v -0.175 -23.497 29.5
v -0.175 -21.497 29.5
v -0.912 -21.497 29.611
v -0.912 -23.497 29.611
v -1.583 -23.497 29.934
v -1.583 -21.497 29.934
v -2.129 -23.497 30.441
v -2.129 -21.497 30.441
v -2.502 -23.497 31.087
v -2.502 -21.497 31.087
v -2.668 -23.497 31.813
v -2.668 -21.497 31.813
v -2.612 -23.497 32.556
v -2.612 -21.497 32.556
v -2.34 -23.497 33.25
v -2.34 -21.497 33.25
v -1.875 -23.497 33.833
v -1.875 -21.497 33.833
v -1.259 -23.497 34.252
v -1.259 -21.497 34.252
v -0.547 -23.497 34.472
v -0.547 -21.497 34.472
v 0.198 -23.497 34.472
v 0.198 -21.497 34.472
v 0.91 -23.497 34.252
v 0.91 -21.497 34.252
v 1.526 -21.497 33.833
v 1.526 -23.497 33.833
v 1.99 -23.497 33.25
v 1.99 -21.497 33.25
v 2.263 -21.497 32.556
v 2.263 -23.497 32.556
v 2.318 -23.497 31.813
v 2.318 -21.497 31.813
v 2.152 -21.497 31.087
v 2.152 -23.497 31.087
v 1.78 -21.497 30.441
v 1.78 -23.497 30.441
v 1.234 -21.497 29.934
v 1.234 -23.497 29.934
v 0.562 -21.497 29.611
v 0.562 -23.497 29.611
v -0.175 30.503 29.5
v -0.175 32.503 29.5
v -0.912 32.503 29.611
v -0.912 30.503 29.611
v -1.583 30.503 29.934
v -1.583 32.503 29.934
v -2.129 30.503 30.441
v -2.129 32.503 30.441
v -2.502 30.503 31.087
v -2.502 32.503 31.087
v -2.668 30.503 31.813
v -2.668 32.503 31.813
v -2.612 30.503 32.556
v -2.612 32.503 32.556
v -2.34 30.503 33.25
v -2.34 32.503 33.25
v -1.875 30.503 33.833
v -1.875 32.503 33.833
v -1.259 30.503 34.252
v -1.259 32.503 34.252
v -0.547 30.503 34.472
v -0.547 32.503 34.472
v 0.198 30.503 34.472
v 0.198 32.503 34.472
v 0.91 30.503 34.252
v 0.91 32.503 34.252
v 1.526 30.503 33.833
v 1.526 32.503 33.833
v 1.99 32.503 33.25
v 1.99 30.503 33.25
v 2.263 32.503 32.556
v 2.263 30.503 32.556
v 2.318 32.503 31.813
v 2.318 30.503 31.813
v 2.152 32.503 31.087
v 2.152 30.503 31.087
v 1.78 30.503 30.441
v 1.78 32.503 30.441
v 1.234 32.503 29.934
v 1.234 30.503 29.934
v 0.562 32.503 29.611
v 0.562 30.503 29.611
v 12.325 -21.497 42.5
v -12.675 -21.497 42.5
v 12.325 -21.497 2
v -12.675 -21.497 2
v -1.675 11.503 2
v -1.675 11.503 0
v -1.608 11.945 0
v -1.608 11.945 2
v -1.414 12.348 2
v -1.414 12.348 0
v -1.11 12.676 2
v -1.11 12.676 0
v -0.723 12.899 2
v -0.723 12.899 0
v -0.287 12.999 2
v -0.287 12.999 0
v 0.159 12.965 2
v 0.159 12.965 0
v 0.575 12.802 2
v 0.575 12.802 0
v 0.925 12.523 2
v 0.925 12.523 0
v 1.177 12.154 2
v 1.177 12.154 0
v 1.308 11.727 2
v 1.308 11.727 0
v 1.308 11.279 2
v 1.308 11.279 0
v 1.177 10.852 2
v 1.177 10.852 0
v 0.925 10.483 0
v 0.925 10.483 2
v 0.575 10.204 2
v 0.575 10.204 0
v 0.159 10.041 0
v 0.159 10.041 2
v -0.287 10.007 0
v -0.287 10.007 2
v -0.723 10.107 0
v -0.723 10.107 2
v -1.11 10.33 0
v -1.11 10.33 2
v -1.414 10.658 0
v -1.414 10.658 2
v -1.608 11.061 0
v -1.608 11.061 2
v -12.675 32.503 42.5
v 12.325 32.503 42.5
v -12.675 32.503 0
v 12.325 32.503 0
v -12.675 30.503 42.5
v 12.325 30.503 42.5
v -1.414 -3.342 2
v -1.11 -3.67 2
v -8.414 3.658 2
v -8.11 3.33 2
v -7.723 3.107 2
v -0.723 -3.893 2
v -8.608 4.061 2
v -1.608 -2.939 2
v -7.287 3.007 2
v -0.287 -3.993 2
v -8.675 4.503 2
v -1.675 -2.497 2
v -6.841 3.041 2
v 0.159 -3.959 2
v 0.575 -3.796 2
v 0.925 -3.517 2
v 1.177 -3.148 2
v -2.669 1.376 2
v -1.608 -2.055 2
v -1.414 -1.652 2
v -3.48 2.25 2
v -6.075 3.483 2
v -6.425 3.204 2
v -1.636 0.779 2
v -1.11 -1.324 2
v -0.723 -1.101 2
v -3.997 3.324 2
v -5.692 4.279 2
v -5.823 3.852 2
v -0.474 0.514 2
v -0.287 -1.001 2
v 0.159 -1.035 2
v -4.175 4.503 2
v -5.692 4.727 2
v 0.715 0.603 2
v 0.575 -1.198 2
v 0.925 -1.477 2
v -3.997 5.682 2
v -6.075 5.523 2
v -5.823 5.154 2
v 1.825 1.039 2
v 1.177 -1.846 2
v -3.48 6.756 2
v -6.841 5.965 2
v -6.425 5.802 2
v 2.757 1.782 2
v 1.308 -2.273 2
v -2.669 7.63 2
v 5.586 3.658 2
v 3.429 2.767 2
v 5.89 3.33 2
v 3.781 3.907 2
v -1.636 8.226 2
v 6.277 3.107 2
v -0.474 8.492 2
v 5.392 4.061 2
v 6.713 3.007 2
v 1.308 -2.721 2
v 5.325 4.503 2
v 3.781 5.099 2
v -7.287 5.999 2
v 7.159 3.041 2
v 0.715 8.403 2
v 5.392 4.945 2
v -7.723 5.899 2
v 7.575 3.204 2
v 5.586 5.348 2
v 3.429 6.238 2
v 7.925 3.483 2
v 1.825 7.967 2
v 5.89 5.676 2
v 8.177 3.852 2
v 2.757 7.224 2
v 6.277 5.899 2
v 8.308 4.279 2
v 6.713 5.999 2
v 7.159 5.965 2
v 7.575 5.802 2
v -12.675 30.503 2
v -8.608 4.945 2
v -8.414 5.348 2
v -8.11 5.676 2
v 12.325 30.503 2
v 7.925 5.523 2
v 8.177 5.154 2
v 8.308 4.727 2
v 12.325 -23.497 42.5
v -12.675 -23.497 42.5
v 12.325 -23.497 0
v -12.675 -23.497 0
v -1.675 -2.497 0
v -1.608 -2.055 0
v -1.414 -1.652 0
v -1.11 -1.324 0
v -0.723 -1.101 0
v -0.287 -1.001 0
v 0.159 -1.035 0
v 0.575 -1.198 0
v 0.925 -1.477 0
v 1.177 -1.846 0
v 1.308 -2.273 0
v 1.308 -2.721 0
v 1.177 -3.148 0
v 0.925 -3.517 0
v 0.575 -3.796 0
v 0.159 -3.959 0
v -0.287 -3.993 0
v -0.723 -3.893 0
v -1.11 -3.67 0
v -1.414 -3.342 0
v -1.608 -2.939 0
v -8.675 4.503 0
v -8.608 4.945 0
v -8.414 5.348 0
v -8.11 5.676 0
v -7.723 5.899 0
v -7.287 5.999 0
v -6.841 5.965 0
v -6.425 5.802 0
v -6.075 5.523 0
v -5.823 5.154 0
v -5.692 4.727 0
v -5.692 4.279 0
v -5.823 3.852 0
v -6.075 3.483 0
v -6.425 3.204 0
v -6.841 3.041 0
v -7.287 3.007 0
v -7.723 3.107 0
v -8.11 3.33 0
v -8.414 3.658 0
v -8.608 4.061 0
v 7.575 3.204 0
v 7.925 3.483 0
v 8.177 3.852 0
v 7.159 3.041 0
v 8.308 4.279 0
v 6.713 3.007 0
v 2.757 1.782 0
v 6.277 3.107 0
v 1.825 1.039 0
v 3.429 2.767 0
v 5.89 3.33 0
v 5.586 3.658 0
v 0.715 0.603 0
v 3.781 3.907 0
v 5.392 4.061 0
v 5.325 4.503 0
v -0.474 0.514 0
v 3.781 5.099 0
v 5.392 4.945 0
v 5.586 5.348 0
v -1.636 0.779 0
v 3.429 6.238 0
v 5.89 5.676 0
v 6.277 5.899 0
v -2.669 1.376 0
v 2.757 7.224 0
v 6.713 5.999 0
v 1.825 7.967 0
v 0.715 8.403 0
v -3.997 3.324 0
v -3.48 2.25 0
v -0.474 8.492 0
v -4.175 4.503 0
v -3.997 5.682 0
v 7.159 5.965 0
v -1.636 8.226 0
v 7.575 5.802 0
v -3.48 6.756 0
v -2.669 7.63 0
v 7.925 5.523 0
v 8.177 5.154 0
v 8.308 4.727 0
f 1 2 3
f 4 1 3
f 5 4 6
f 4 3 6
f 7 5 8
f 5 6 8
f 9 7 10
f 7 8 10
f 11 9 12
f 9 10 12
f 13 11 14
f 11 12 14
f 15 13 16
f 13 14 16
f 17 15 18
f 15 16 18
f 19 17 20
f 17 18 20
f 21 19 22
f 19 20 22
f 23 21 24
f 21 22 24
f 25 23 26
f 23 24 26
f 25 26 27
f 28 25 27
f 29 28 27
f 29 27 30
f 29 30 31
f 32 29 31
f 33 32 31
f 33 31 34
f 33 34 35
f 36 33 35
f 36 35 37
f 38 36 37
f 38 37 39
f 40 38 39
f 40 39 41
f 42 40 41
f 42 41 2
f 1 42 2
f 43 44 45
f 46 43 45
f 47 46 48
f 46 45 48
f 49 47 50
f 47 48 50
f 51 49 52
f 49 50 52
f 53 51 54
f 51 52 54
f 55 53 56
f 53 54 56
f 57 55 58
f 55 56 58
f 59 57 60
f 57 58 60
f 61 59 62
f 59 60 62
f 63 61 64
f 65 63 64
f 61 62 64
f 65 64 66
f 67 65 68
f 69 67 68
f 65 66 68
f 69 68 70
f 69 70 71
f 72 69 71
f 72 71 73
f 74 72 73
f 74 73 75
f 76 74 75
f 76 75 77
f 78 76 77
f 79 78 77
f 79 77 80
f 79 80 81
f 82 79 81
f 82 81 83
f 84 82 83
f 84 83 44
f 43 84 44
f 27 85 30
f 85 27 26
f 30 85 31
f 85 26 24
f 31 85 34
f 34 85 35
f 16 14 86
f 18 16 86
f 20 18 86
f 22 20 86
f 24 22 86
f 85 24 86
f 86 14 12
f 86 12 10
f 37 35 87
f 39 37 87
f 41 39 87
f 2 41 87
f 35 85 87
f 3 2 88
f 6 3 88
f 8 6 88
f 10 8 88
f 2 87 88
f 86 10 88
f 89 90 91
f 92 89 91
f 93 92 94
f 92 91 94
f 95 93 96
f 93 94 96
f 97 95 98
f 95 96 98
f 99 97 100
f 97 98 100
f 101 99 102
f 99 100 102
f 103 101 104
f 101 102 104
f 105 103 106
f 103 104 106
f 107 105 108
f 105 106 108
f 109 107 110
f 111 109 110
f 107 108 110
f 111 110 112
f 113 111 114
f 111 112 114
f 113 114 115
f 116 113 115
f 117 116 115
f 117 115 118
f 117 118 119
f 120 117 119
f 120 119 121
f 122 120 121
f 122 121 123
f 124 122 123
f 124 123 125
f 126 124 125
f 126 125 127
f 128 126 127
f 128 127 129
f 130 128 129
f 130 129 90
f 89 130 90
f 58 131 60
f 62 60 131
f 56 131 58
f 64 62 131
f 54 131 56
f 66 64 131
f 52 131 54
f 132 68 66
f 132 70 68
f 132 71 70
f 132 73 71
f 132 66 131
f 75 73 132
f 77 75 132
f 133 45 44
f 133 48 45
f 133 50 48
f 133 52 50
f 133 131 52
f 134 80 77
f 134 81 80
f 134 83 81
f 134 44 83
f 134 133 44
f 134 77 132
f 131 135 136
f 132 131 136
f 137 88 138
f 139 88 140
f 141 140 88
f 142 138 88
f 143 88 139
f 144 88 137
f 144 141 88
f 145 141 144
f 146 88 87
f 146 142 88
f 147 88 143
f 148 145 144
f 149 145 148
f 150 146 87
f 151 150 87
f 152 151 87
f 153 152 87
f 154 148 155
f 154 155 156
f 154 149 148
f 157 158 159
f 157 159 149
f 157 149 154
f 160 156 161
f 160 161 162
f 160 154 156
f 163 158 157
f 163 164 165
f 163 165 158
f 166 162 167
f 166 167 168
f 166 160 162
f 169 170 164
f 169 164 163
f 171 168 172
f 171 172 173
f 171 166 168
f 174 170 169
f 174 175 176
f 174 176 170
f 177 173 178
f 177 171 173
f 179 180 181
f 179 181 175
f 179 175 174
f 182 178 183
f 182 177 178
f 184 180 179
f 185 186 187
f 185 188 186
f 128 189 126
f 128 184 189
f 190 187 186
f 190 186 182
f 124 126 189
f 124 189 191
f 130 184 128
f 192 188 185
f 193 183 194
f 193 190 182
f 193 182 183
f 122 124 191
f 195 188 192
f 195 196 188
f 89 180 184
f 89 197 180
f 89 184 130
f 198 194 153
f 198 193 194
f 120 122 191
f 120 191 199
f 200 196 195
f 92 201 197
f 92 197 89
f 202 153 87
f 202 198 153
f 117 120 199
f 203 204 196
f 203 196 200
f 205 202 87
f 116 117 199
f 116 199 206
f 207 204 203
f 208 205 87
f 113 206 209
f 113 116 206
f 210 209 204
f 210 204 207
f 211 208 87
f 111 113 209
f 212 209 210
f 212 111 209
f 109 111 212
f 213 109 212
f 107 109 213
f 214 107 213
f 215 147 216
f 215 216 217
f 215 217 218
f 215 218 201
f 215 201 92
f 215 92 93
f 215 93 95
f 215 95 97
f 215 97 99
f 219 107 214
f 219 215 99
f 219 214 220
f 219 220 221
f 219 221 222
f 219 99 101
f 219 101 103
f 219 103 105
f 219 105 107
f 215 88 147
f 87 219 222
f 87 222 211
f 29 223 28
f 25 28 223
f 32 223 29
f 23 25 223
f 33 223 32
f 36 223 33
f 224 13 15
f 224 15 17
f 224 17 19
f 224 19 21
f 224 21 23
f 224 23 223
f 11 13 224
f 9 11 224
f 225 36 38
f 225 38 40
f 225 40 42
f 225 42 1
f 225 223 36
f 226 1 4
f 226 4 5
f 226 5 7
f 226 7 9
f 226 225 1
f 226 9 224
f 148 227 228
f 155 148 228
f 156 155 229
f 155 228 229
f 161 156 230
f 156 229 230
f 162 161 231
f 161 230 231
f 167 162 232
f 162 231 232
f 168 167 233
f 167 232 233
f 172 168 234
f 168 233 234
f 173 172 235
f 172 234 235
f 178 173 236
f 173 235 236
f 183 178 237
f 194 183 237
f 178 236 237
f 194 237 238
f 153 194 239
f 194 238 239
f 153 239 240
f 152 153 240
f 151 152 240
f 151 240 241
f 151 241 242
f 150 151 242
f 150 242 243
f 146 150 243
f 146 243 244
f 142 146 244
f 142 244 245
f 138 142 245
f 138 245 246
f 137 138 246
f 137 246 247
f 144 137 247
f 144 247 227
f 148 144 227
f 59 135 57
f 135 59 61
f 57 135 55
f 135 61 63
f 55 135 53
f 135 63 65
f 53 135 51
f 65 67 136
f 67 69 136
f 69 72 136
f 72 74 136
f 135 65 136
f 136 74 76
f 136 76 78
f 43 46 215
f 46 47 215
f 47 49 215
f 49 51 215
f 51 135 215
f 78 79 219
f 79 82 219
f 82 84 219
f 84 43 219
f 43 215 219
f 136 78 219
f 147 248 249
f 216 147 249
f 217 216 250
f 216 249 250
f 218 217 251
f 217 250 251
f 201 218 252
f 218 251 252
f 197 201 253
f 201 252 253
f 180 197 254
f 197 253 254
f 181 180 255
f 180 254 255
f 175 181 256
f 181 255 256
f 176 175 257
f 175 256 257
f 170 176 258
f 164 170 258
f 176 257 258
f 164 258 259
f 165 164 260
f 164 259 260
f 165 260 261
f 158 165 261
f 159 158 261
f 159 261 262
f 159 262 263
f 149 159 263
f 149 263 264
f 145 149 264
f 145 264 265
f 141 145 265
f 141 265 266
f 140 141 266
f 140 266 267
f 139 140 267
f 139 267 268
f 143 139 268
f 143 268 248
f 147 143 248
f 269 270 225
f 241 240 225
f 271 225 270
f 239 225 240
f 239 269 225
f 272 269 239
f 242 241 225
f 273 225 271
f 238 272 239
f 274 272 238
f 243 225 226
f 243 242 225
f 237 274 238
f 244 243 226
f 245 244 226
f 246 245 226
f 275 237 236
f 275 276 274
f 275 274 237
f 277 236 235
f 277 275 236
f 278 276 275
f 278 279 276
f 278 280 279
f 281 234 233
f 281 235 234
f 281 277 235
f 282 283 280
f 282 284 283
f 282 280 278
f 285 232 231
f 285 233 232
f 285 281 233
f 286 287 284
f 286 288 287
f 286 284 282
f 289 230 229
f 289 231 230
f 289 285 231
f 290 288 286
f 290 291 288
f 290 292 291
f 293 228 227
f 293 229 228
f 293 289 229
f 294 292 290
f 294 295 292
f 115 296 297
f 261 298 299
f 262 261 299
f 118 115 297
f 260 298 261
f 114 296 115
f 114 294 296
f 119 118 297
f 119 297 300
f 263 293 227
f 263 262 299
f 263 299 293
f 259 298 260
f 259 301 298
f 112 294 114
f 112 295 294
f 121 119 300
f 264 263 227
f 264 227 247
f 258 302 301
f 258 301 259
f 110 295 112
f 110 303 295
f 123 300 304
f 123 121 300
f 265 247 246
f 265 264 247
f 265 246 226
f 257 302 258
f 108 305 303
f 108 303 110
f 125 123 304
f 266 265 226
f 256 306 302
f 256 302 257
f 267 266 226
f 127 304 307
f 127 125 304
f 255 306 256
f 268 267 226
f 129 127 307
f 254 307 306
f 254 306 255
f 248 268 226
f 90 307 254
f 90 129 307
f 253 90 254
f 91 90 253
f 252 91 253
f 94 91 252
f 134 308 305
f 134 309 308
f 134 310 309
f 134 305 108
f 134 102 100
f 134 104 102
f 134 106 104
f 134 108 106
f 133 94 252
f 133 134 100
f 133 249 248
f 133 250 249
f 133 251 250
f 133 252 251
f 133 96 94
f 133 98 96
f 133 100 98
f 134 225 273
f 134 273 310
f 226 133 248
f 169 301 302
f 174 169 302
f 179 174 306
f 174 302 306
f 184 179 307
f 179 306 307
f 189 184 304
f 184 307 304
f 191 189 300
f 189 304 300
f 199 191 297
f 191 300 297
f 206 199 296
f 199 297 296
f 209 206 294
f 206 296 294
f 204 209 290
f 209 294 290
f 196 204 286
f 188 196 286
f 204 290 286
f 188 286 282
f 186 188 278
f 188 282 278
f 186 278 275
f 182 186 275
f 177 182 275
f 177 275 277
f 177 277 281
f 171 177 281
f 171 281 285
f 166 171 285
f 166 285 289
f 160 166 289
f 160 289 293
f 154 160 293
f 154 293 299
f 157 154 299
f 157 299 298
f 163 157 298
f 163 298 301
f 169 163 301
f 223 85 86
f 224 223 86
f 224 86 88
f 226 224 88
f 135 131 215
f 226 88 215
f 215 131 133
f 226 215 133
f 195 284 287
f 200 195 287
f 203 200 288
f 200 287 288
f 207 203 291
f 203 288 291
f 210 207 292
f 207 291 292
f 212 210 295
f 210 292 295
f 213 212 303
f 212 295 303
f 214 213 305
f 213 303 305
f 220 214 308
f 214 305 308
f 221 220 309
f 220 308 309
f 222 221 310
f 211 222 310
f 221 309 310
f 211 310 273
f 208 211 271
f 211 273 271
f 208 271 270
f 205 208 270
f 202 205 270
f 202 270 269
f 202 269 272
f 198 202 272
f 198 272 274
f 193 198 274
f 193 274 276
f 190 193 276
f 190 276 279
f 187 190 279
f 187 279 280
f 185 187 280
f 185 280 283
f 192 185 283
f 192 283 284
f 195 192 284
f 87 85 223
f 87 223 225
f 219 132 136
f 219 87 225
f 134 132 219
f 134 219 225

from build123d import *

# Parameters (mm, degrees)
SKETCH1_W           = 25
SKETCH1_H           = 52
BOSS_EXTRUDE1_DEPTH = 2
SKETCH2_W           = 25
SKETCH2_H           = 42.5
BOSS_EXTRUDE2_DEPTH = 2
SKETCH3_W           = 25
SKETCH3_H           = 42.5
BOSS_EXTRUDE3_DEPTH = 2
SKETCH4_R           = 2.5
CUT_EXTRUDE1_DEPTH  = 70
SKETCH5_R           = 4
CUT_EXTRUDE2_DEPTH  = 21
SKETCH6_R           = 1.5
CUT_EXTRUDE3_DEPTH  = 21


with BuildPart() as part:
    # Sketch1 → Boss-Extrude1 (new body)
    with BuildSketch(Plane.XY):
        with Locations((-0.174770451, 4.502942624)):
            Rectangle(SKETCH1_W, SKETCH1_H)
    extrude(amount=BOSS_EXTRUDE1_DEPTH)

    # Sketch2 → Boss-Extrude2 (add)
    with BuildSketch(Plane(origin=(0, 30.502942624, 0), x_dir=(1, 0, 0), z_dir=(0, 1, 0))):
        with Locations((-0.174770451, -21.25)):
            Rectangle(SKETCH2_W, SKETCH2_H)
    extrude(amount=BOSS_EXTRUDE2_DEPTH)

    # Sketch3 → Boss-Extrude3 (add)
    with BuildSketch(Plane(origin=(0, -21.497057376, 0), x_dir=(-1, 0, 0), z_dir=(0, -1, 0))):
        with Locations((0.174770451, -21.25)):
            Rectangle(SKETCH3_W, SKETCH3_H)
    extrude(amount=BOSS_EXTRUDE3_DEPTH)

    # Sketch4 → Cut-Extrude1 (cut)
    with BuildSketch(Plane(origin=(0, 32.502942624, 0), x_dir=(1, 0, 0), z_dir=(0, 1, 0))):
        with Locations(Location((-0.174770451, -32, 0), (0, 0, 90))):
            Circle(SKETCH4_R)
    extrude(amount=-CUT_EXTRUDE1_DEPTH, mode=Mode.SUBTRACT)

    # Sketch5 → Cut-Extrude2 (cut)
    with BuildSketch(Plane(origin=(0, 0, 0), x_dir=(-1, 0, 0), z_dir=(0, 0, -1))):
        with Locations((0.174770451, 4.502942624)):
            Circle(SKETCH5_R)
    extrude(amount=-CUT_EXTRUDE2_DEPTH, mode=Mode.SUBTRACT)

    # Sketch6 → Cut-Extrude3 (cut)
    with BuildSketch(Plane(origin=(0, 0, 0), x_dir=(-1, 0, 0), z_dir=(0, 0, -1))):
        with Locations((7.174770451, 4.502942624)):
            Circle(SKETCH6_R)
        with Locations((0.174770451, -2.497057376)):
            Circle(SKETCH6_R)
        with Locations((-6.825229549, 4.502942624)):
            Circle(SKETCH6_R)
        with Locations((0.174770451, 11.502942624)):
            Circle(SKETCH6_R)
    extrude(amount=-CUT_EXTRUDE3_DEPTH, mode=Mode.SUBTRACT)


solid = part.part
